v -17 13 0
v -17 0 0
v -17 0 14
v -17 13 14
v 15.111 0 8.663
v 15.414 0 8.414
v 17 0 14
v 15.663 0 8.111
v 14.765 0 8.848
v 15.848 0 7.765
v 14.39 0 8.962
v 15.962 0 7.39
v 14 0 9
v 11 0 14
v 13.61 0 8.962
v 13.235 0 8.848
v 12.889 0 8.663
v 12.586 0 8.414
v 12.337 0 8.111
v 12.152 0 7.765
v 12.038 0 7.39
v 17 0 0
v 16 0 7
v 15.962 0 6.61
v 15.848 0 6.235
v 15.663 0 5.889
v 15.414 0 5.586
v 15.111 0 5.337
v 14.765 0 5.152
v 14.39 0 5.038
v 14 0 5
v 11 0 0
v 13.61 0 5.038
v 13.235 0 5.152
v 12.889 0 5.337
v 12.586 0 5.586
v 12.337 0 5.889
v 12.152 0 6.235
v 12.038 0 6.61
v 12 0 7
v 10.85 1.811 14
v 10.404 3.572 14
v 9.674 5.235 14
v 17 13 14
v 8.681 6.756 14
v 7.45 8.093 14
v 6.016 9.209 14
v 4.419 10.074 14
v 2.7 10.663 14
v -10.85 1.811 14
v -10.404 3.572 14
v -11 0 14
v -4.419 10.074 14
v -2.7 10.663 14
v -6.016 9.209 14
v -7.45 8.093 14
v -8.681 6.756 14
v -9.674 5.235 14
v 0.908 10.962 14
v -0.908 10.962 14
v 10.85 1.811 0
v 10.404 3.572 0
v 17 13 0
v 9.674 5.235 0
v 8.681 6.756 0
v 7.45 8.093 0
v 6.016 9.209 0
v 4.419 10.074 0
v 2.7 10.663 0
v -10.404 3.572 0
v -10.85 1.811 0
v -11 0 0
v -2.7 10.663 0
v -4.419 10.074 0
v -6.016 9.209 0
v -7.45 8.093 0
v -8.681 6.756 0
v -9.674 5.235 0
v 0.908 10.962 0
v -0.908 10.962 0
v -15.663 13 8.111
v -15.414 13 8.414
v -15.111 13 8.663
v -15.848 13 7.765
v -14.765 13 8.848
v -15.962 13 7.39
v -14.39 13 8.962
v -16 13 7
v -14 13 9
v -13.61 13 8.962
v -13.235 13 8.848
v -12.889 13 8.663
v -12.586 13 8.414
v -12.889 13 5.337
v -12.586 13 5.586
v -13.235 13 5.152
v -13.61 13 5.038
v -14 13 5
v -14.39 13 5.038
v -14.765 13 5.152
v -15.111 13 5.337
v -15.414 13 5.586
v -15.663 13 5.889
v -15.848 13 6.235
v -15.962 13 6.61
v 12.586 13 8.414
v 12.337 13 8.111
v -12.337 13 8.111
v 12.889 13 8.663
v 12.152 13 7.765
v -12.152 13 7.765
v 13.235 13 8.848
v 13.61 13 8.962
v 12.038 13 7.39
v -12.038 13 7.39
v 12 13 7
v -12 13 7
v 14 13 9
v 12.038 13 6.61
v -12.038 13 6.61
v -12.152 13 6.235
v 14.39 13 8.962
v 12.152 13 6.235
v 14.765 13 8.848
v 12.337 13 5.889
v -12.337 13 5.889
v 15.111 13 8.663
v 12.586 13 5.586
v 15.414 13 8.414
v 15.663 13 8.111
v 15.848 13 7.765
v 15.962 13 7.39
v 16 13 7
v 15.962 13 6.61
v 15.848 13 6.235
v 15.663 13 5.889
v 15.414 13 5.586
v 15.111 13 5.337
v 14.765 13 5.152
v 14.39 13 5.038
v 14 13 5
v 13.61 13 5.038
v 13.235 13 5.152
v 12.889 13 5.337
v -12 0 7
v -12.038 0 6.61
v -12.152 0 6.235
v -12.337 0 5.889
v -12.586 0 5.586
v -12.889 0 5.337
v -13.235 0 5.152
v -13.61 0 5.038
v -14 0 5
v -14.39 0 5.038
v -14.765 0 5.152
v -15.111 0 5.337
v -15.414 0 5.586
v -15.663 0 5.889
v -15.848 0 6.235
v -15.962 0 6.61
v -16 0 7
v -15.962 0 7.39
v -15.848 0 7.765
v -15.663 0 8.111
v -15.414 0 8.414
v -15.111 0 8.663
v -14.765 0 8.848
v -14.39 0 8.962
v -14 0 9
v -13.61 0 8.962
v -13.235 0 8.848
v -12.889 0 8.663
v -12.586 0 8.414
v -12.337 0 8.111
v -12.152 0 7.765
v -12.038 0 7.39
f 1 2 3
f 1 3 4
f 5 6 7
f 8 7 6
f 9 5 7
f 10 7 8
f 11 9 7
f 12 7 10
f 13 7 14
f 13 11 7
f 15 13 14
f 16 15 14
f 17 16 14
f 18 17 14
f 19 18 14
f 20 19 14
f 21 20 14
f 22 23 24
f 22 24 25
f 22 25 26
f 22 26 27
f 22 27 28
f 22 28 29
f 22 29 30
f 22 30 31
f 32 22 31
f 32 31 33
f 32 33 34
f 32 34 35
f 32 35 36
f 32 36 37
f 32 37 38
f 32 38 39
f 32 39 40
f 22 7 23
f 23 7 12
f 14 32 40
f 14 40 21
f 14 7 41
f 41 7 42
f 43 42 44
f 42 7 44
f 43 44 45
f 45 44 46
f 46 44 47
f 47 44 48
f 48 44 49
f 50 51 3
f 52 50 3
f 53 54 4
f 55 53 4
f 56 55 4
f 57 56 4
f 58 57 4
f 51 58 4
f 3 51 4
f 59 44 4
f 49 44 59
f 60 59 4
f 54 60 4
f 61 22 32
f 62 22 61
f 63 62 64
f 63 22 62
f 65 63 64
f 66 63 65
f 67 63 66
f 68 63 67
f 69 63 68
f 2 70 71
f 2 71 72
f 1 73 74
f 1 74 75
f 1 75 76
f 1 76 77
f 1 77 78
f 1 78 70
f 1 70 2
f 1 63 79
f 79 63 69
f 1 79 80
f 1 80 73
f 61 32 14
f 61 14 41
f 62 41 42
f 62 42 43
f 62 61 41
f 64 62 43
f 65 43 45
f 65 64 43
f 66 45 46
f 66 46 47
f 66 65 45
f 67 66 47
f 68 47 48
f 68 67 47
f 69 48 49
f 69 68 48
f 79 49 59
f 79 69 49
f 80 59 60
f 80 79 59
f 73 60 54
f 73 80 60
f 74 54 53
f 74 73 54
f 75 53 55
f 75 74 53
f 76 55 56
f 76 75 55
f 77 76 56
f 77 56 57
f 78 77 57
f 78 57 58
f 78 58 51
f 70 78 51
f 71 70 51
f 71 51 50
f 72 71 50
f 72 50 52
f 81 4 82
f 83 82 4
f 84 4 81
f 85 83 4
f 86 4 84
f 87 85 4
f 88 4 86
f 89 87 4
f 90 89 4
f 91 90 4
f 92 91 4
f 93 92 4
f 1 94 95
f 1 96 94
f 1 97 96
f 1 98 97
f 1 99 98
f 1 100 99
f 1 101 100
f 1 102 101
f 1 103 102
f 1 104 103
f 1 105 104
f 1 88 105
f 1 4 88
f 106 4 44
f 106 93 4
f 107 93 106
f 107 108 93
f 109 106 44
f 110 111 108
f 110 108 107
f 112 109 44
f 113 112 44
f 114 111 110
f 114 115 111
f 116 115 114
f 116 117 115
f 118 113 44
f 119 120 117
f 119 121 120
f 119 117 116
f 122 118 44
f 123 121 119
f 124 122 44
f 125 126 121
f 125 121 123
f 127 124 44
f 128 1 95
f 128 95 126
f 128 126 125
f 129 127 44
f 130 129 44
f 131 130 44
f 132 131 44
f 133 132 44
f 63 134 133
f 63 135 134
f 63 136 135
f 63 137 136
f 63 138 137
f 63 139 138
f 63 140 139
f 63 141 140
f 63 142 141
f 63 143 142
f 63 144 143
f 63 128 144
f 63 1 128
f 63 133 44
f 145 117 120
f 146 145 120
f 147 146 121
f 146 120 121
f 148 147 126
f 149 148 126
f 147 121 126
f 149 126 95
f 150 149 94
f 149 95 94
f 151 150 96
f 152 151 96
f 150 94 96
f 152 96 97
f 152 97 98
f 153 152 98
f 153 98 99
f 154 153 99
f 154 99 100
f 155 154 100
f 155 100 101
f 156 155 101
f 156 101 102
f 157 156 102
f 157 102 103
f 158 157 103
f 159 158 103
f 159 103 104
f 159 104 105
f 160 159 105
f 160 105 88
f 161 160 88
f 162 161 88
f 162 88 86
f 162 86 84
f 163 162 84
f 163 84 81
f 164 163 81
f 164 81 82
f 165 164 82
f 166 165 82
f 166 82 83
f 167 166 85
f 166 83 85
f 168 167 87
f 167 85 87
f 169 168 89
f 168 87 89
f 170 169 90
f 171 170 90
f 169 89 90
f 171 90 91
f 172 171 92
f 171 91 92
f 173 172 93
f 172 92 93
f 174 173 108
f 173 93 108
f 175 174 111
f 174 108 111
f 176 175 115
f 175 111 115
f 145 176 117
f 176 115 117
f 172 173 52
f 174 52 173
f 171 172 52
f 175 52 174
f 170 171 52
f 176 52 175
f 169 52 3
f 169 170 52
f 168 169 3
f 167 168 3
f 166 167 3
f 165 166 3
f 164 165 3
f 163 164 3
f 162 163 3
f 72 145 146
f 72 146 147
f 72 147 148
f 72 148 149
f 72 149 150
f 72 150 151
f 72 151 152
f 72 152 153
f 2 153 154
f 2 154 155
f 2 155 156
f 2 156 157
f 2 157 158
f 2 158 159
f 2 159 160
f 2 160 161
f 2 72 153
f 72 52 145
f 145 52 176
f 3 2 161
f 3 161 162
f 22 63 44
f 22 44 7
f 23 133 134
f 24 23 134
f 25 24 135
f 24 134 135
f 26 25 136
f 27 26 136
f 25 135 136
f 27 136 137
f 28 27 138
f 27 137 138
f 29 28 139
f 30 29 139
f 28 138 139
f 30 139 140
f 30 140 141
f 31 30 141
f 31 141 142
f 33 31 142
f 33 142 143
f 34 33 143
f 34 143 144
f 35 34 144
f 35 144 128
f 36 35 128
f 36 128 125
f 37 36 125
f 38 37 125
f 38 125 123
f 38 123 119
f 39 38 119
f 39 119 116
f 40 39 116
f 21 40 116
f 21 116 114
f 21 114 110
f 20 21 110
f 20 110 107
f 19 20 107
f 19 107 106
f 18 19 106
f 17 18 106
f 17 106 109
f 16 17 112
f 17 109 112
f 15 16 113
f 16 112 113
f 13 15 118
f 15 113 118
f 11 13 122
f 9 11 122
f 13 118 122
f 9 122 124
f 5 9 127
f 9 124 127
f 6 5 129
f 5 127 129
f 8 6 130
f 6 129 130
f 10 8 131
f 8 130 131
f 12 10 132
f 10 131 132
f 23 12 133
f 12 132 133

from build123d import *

# Parameters (mm, degrees)
EXTRUSION1_DEPTH = 14
ESQUISSE2_R      = 2
EXTRUSION2_DEPTH = 14


with BuildPart() as part:
    # Esquisse1 → Extrusion1 (new body)
    with BuildSketch(Plane.XY):
        with BuildLine():
            Line((-17, 0), (-17, 13))
            Line((-17, 13), (17, 13))
            Line((17, 13), (17, 0))
            Line((17, 0), (11, 0))
            ThreePointArc((11, 0), (0, 11), (-11, 0))
            Line((-11, 0), (-17, 0))
        make_face()
    extrude(amount=EXTRUSION1_DEPTH)

    # Esquisse2 → Extrusion2 (cut, through all)
    with BuildSketch(Plane(origin=(0, 13, 0), x_dir=(1, 0, 0), z_dir=(0, 1, 0))):
        with Locations((-14, -7)):
            Circle(ESQUISSE2_R)
        with Locations((14, -7)):
            Circle(ESQUISSE2_R)
    extrude(amount=-EXTRUSION2_DEPTH, mode=Mode.SUBTRACT)


solid = part.part
